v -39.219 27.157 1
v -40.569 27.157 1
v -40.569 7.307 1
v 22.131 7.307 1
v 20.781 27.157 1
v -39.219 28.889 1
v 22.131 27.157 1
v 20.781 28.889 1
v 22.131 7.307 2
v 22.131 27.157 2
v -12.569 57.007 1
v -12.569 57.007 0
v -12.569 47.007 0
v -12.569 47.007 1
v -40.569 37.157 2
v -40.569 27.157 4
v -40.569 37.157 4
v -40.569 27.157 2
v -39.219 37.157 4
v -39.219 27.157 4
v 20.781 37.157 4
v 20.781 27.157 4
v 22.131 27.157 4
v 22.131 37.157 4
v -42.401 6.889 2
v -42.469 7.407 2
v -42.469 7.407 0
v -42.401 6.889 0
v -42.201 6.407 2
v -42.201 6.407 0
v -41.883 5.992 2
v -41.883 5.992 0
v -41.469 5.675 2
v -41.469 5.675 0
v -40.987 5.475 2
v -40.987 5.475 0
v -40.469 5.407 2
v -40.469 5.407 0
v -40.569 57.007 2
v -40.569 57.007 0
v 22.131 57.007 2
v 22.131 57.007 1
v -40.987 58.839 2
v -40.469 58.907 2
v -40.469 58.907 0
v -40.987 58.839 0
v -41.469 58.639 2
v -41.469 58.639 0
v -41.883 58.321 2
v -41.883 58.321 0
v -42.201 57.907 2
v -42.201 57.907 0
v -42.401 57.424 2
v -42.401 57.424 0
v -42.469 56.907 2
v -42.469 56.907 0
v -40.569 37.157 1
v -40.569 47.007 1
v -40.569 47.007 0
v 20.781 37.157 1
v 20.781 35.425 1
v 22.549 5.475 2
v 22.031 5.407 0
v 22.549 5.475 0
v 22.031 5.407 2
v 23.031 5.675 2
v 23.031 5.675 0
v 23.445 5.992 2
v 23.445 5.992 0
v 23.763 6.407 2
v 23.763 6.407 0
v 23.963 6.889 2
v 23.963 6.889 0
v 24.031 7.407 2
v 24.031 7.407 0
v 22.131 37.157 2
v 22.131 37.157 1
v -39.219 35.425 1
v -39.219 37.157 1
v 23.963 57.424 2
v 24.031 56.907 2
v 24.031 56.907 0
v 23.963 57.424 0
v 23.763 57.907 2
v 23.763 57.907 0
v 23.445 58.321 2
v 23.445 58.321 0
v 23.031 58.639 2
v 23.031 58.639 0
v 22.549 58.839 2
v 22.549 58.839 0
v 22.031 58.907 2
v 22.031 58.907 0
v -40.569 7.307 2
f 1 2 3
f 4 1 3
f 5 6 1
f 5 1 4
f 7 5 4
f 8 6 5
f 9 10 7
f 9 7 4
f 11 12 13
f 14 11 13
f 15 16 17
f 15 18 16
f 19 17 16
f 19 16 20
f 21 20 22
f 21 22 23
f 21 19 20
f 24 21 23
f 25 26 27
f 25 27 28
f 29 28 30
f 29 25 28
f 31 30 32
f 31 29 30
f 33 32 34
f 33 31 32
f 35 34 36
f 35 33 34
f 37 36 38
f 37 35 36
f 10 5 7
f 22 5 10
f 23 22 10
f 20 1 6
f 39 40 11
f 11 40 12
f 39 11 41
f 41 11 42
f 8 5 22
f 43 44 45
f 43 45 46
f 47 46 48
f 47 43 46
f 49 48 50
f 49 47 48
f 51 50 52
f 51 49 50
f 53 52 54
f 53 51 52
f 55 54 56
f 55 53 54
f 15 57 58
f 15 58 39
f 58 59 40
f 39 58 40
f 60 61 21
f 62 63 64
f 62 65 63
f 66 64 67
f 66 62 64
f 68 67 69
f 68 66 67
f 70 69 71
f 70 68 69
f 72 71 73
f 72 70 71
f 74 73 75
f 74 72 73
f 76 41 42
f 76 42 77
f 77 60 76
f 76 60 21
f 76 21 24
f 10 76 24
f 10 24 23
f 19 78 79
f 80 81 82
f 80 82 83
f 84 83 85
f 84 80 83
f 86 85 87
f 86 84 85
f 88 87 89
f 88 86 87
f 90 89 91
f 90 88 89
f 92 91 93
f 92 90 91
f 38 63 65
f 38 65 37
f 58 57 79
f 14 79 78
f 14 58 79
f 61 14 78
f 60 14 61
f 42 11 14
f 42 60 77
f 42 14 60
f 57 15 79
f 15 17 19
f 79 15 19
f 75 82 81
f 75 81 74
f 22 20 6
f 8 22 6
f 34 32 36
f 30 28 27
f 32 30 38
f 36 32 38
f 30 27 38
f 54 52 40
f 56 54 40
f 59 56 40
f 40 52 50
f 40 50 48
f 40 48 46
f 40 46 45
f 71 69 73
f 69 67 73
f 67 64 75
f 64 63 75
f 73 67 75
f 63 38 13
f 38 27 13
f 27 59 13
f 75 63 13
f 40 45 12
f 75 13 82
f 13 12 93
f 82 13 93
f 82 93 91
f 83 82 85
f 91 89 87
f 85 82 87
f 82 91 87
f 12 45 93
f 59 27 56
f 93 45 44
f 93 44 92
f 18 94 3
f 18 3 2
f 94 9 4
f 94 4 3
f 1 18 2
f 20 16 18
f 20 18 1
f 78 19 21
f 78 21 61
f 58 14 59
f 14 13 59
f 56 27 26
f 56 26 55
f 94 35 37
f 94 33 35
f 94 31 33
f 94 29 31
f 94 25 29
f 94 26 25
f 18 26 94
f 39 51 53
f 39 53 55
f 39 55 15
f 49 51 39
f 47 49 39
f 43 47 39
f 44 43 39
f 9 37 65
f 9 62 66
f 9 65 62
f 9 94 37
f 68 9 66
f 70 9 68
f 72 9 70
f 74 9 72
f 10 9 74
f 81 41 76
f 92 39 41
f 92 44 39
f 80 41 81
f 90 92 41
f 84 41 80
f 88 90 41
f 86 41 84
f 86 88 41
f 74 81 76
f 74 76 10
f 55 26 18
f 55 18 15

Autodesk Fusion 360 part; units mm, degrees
sketch "Schizzo1" plane through (0, 0, 0) normal (0, 0, 1) x (1, 0, 0)
  line L0 (-42.5691, 59.0067) -> (24.1309, 59.0067) construction
  line L1 (24.1309, 59.0067) -> (24.1309, 5.3067) construction
  line L2 (24.1309, 5.3067) -> (-42.5691, 5.3067) construction
  line L3 (-42.5691, 5.3067) -> (-42.5691, 59.0067) construction
  line L4 (24.0309, 58.9067) -> (24.0309, 5.4067)
  line L5 (24.0309, 5.4067) -> (-42.4691, 5.4067)
  line L6 (-42.4691, 5.4067) -> (-42.4691, 58.9067)
  line L7 (-42.4691, 58.9067) -> (24.0309, 58.9067)
  line L8 (22.1309, 7.3067) -> (-40.5691, 7.3067)
  line L9 (-40.5691, 7.3067) -> (-40.5691, 57.0067)
  line L10 (-40.5691, 57.0067) -> (22.1309, 57.0067)
  line L11 (22.1309, 57.0067) -> (22.1309, 7.3067)
  line L12 (-40.5691, 57.0067) -> (-12.5691, 57.0067)
  line L13 (-12.5691, 57.0067) -> (-12.5691, 47.0067)
  line L14 (-12.5691, 47.0067) -> (-40.5691, 47.0067)
  line L15 (-40.5691, 47.0067) -> (-40.5691, 57.0067)
  line L16 (-42.5691, 32.1567) -> (24.1309, 32.1567) construction
  line L17 (-9.2191, 59.0067) -> (-9.2191, 5.3067) construction
  line L18 (-40.5691, 37.1567) -> (22.1309, 37.1567)
  line L19 (-40.5691, 27.1567) -> (22.1309, 27.1567)
  dimension "d1" = 66.7
  dimension "d2" = 53.7
  dimension "d3" = 0.1
  dimension "d8" = 2
  dimension "d9" = 28
  dimension "d10" = 10
  dimension "d11" = 10
extrude "Estrusione1" add sketch "Schizzo1" along normal blind 4 contours L8 L9 L11 L19 | L9 L11 L18 L19 | L9 L10 L11 L13 L14 L18
extrude "Estrusione4" add sketch "Schizzo1" along normal blind 2
fillet "Raccordo1" radius 2 4 edges at (-42.4691, 5.4067, 1) (24.0309, 5.4067, 1) (24.0309, 58.9067, 1) (-42.4691, 58.9067, 1)
extrude "Estrusione2" cut sketch "Schizzo1" against normal blind 3 from surface at 4 contours L8 L9 L11 L19 | L9 L10 L11 L13 L14 L18
ref_plane "Piano di lavoro1" through (-9.2191, 32.1567, 0) normal (1, 0, 0) x (0, -1, 0)
sketch "Schizzo2" plane through (-9.2191, 0, 0) normal (1, 0, 0) x (0, 1, 0)
  line L0 (5.4067, 4) -> (58.9067, 4) construction
  line L1 (58.9067, 4) -> (58.9067, 0) construction
  line L2 (58.9067, 0) -> (5.4067, 0) construction
  line L3 (5.4067, 0) -> (5.4067, 4) construction
  line L4 (58.9067, 2) -> (58.9067, 0) construction
  line L5 (7.4067, 0) -> (56.9067, 0) construction
  line L6 (5.4067, 0) -> (5.4067, 2) construction
  line L7 (37.1567, 4) -> (27.1567, 4) construction
  line L8 (32.1567, 4) -> (32.1567, 0) construction
  line L9 (27.1567, 4) -> (27.1567, 0) construction
  line L10 (27.1567, 2) -> (27.1567, 4) construction
  line L11 (5.4067, 1) -> (58.9067, 1) construction
  line L12 (7.3067, 1) -> (27.1567, 1) construction
  line L13 (37.1567, 4) -> (37.1567, 0) construction
  line L14 (27.1567, 4) -> (28.8887, 1)
  line L15 (27.1567, 4) -> (30.6208, 4) construction
  line L16 (28.8887, 1) -> (27.1567, 1)
  line L17 (27.1567, 1) -> (27.1567, 4)
  line L18 (37.1567, 4) -> (35.4246, 1)
  line L19 (37.1567, 1) -> (37.1567, 4)
  line L20 (35.4246, 1) -> (37.1567, 1)
  dimension "d24" = 60
extrude "Estrusione3" cut sketch "Schizzo2" along normal mid plane 60
